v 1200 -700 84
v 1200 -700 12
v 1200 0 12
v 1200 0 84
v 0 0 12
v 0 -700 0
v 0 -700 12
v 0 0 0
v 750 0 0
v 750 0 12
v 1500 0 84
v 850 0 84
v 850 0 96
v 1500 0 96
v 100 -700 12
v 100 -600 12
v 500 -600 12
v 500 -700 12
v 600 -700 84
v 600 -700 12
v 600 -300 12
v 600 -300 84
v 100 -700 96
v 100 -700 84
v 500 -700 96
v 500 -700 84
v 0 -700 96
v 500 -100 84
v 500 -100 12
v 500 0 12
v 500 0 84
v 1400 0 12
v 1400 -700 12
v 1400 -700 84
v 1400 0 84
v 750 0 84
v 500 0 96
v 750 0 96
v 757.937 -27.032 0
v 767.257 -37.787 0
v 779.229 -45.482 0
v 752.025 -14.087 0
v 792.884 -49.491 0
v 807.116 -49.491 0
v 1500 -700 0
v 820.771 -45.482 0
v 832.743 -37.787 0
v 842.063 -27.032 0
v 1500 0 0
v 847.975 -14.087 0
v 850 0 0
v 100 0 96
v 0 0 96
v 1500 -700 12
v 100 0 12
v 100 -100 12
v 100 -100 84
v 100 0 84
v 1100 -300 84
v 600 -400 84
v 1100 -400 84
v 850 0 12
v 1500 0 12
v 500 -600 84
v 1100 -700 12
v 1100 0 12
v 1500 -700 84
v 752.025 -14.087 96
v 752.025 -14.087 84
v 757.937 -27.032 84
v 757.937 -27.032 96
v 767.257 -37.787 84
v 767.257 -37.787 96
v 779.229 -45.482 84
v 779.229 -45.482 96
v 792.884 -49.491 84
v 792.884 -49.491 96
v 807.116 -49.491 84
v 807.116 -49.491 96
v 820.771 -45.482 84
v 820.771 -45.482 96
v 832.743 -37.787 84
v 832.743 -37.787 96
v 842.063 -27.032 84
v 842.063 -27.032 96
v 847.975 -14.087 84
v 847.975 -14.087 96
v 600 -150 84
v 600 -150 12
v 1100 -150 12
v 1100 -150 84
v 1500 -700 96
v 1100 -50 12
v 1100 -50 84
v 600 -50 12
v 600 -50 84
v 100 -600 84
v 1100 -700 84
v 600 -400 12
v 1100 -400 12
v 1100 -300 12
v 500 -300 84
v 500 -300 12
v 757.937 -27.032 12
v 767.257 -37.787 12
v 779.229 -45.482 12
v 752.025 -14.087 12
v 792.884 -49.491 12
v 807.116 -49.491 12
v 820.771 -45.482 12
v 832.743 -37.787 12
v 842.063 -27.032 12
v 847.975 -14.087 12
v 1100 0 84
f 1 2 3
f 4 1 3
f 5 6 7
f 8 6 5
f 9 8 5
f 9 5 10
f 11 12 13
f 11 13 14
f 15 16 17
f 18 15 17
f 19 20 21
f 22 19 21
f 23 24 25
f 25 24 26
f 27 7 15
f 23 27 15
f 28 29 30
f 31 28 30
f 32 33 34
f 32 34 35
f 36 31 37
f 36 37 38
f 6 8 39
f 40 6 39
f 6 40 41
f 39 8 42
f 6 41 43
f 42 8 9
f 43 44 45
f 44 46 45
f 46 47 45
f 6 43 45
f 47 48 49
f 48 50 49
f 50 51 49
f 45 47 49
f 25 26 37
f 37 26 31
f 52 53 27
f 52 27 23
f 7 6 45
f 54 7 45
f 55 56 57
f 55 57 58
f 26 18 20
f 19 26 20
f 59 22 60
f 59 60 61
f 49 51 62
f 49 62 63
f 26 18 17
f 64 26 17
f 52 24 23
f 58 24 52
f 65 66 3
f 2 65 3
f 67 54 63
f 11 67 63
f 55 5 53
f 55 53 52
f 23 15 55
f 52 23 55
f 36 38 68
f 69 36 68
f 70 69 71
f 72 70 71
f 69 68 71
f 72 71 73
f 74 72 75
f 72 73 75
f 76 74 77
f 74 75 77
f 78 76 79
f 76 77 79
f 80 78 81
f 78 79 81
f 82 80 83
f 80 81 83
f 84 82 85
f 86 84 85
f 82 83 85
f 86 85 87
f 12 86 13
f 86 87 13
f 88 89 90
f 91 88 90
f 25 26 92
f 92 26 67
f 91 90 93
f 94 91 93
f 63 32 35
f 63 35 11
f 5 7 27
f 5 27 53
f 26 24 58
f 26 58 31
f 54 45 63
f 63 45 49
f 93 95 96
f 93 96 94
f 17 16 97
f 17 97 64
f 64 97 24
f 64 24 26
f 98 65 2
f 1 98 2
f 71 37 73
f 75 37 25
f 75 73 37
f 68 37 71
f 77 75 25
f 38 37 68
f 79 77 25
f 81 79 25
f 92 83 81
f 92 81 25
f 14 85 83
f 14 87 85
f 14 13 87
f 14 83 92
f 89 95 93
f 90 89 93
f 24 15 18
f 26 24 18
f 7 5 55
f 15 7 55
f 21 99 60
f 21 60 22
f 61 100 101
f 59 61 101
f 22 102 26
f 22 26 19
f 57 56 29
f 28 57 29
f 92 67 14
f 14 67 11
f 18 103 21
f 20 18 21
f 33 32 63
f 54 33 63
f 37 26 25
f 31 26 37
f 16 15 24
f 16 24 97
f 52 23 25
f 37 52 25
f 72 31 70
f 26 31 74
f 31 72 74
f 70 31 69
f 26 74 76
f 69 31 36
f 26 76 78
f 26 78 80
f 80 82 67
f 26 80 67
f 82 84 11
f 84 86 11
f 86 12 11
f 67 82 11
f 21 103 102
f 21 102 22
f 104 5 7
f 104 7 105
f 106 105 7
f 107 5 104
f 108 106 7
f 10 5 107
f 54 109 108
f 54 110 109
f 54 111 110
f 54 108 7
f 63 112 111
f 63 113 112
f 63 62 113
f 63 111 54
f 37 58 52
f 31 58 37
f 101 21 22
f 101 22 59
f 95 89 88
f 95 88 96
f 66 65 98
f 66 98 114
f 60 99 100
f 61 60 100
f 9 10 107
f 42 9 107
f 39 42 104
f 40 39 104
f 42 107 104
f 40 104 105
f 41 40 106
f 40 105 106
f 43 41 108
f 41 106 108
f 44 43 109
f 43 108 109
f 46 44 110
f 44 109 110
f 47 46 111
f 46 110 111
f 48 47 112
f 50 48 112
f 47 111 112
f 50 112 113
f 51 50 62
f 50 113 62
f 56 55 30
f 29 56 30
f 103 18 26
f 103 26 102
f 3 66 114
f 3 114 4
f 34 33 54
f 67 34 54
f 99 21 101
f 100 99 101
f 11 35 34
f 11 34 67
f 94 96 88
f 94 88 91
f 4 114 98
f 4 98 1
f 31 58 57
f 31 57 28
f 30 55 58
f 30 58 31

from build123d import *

# Parameters (mm, degrees)
F0_W      = 1500
F0_H      = 700
F1_DEPTH  = 12
F2_W      = 100
F2_H      = 700
F3_DEPTH  = 84
F4_W      = 400
F4_H      = 100
F5_DEPTH  = 72
F6_W      = 400
F6_H      = 100
F7_DEPTH  = 72
F8_W      = 100
F8_H      = 700
F9_DEPTH  = 72
F10_W     = 100
F10_H     = 700
F11_DEPTH = 72
F12_W     = 100
F12_H     = 400
F13_DEPTH = 72
F14_W     = 500
F14_H     = 100
F15_DEPTH = 72
F16_W     = 1000
F16_H     = 700
F17_DEPTH = 12
F18_W     = 400
F18_H     = 700
F19_DEPTH = 12
F21_DEPTH = 96.001
F23_DEPTH = 12.001


with BuildPart() as f1:
    # F0 (on Top) → F1 (new body)
    with BuildSketch(Plane.XY):
        with Locations((750, -350)):
            Rectangle(F0_W, F0_H)
    extrude(amount=F1_DEPTH)


with BuildPart() as f3:
    # F2 (on face) → F3 (new body)
    with BuildSketch(Plane.XY.offset(12)):
        with Locations((50, -350)):
            Rectangle(F2_W, F2_H)
    extrude(amount=F3_DEPTH)


with BuildPart() as f5:
    # F4 (on face) → F5 (new body)
    with BuildSketch(Plane.XY.offset(12)):
        with Locations((300, -50)):
            Rectangle(F4_W, F4_H)
    extrude(amount=F5_DEPTH)


with BuildPart() as f7:
    # F6 (on face) → F7 (new body)
    with BuildSketch(Plane.XY.offset(12)):
        with Locations((300, -650)):
            Rectangle(F6_W, F6_H)
    extrude(amount=F7_DEPTH)


with BuildPart() as f9:
    # F8 (on face) → F9 (new body)
    with BuildSketch(Plane.XY.offset(12)):
        with Locations((1450, -350)):
            Rectangle(F8_W, F8_H)
    extrude(amount=F9_DEPTH)


with BuildPart() as f11:
    # F10 (on face) → F11 (new body)
    with BuildSketch(Plane.XY.offset(12)):
        with Locations((1150, -350)):
            Rectangle(F10_W, F10_H)
    extrude(amount=F11_DEPTH)


with BuildPart() as f13:
    # F12 (on face) → F13 (new body)
    with BuildSketch(Plane.XY.offset(12)):
        with Locations((550, -500)):
            Rectangle(F12_W, F12_H)
    extrude(amount=F13_DEPTH)


with BuildPart() as f15:
    # F14 (on face) → F15 (new body)
    with BuildSketch(Plane.XY.offset(12)):
        with Locations((850, -350)):
            Rectangle(F14_W, F14_H)
    extrude(amount=F15_DEPTH)


with BuildPart() as f15b:
    # F14 (on face) → F15, piece 2 (new body)
    with BuildSketch(Plane.XY.offset(12)):
        with Locations((850, -100)):
            Rectangle(F14_W, F14_H)
    extrude(amount=F15_DEPTH)


with BuildPart() as f17:
    # F16 (on face) → F17 (new body)
    with BuildSketch(Plane.XY.offset(84)):
        with Locations((1000, -350)):
            Rectangle(F16_W, F16_H)
    extrude(amount=F17_DEPTH)


with BuildPart() as f19:
    # F18 (on face) → F19 (new body)
    with BuildSketch(Plane.XY.offset(84)):
        with Locations((300, -350)):
            Rectangle(F18_W, F18_H)
    extrude(amount=F19_DEPTH)


with BuildPart() as f21_tool:
    # F20 (on face) → F21 (new body, through all)
    with BuildSketch(Plane.XY.offset(96)):
        with BuildLine():
            Line((850, 0), (750, 0))
            ThreePointArc((750, 0), (800, -50), (850, 0))
        make_face()
    extrude(amount=-F21_DEPTH)


with BuildPart() as f1_1:
    add(f1.part)

    # F21: cut by f21_tool
    add(f21_tool.part, mode=Mode.SUBTRACT)

    # F22 (on face) → F23 (cut, through all)
    with BuildSketch(Plane.XY.offset(12)):
        with BuildLine():
            Line((850, 0), (750, 0))
            ThreePointArc((750, 0), (800, -50), (850, 0))
        make_face()
    extrude(amount=-F23_DEPTH, mode=Mode.SUBTRACT)


with BuildPart() as f17_1:
    add(f17.part)

    # F21: cut by f21_tool
    add(f21_tool.part, mode=Mode.SUBTRACT)


solid = Compound([f3.part, f5.part, f7.part, f9.part, f11.part, f13.part, f15.part, f15b.part, f19.part, f1_1.part, f17_1.part])
